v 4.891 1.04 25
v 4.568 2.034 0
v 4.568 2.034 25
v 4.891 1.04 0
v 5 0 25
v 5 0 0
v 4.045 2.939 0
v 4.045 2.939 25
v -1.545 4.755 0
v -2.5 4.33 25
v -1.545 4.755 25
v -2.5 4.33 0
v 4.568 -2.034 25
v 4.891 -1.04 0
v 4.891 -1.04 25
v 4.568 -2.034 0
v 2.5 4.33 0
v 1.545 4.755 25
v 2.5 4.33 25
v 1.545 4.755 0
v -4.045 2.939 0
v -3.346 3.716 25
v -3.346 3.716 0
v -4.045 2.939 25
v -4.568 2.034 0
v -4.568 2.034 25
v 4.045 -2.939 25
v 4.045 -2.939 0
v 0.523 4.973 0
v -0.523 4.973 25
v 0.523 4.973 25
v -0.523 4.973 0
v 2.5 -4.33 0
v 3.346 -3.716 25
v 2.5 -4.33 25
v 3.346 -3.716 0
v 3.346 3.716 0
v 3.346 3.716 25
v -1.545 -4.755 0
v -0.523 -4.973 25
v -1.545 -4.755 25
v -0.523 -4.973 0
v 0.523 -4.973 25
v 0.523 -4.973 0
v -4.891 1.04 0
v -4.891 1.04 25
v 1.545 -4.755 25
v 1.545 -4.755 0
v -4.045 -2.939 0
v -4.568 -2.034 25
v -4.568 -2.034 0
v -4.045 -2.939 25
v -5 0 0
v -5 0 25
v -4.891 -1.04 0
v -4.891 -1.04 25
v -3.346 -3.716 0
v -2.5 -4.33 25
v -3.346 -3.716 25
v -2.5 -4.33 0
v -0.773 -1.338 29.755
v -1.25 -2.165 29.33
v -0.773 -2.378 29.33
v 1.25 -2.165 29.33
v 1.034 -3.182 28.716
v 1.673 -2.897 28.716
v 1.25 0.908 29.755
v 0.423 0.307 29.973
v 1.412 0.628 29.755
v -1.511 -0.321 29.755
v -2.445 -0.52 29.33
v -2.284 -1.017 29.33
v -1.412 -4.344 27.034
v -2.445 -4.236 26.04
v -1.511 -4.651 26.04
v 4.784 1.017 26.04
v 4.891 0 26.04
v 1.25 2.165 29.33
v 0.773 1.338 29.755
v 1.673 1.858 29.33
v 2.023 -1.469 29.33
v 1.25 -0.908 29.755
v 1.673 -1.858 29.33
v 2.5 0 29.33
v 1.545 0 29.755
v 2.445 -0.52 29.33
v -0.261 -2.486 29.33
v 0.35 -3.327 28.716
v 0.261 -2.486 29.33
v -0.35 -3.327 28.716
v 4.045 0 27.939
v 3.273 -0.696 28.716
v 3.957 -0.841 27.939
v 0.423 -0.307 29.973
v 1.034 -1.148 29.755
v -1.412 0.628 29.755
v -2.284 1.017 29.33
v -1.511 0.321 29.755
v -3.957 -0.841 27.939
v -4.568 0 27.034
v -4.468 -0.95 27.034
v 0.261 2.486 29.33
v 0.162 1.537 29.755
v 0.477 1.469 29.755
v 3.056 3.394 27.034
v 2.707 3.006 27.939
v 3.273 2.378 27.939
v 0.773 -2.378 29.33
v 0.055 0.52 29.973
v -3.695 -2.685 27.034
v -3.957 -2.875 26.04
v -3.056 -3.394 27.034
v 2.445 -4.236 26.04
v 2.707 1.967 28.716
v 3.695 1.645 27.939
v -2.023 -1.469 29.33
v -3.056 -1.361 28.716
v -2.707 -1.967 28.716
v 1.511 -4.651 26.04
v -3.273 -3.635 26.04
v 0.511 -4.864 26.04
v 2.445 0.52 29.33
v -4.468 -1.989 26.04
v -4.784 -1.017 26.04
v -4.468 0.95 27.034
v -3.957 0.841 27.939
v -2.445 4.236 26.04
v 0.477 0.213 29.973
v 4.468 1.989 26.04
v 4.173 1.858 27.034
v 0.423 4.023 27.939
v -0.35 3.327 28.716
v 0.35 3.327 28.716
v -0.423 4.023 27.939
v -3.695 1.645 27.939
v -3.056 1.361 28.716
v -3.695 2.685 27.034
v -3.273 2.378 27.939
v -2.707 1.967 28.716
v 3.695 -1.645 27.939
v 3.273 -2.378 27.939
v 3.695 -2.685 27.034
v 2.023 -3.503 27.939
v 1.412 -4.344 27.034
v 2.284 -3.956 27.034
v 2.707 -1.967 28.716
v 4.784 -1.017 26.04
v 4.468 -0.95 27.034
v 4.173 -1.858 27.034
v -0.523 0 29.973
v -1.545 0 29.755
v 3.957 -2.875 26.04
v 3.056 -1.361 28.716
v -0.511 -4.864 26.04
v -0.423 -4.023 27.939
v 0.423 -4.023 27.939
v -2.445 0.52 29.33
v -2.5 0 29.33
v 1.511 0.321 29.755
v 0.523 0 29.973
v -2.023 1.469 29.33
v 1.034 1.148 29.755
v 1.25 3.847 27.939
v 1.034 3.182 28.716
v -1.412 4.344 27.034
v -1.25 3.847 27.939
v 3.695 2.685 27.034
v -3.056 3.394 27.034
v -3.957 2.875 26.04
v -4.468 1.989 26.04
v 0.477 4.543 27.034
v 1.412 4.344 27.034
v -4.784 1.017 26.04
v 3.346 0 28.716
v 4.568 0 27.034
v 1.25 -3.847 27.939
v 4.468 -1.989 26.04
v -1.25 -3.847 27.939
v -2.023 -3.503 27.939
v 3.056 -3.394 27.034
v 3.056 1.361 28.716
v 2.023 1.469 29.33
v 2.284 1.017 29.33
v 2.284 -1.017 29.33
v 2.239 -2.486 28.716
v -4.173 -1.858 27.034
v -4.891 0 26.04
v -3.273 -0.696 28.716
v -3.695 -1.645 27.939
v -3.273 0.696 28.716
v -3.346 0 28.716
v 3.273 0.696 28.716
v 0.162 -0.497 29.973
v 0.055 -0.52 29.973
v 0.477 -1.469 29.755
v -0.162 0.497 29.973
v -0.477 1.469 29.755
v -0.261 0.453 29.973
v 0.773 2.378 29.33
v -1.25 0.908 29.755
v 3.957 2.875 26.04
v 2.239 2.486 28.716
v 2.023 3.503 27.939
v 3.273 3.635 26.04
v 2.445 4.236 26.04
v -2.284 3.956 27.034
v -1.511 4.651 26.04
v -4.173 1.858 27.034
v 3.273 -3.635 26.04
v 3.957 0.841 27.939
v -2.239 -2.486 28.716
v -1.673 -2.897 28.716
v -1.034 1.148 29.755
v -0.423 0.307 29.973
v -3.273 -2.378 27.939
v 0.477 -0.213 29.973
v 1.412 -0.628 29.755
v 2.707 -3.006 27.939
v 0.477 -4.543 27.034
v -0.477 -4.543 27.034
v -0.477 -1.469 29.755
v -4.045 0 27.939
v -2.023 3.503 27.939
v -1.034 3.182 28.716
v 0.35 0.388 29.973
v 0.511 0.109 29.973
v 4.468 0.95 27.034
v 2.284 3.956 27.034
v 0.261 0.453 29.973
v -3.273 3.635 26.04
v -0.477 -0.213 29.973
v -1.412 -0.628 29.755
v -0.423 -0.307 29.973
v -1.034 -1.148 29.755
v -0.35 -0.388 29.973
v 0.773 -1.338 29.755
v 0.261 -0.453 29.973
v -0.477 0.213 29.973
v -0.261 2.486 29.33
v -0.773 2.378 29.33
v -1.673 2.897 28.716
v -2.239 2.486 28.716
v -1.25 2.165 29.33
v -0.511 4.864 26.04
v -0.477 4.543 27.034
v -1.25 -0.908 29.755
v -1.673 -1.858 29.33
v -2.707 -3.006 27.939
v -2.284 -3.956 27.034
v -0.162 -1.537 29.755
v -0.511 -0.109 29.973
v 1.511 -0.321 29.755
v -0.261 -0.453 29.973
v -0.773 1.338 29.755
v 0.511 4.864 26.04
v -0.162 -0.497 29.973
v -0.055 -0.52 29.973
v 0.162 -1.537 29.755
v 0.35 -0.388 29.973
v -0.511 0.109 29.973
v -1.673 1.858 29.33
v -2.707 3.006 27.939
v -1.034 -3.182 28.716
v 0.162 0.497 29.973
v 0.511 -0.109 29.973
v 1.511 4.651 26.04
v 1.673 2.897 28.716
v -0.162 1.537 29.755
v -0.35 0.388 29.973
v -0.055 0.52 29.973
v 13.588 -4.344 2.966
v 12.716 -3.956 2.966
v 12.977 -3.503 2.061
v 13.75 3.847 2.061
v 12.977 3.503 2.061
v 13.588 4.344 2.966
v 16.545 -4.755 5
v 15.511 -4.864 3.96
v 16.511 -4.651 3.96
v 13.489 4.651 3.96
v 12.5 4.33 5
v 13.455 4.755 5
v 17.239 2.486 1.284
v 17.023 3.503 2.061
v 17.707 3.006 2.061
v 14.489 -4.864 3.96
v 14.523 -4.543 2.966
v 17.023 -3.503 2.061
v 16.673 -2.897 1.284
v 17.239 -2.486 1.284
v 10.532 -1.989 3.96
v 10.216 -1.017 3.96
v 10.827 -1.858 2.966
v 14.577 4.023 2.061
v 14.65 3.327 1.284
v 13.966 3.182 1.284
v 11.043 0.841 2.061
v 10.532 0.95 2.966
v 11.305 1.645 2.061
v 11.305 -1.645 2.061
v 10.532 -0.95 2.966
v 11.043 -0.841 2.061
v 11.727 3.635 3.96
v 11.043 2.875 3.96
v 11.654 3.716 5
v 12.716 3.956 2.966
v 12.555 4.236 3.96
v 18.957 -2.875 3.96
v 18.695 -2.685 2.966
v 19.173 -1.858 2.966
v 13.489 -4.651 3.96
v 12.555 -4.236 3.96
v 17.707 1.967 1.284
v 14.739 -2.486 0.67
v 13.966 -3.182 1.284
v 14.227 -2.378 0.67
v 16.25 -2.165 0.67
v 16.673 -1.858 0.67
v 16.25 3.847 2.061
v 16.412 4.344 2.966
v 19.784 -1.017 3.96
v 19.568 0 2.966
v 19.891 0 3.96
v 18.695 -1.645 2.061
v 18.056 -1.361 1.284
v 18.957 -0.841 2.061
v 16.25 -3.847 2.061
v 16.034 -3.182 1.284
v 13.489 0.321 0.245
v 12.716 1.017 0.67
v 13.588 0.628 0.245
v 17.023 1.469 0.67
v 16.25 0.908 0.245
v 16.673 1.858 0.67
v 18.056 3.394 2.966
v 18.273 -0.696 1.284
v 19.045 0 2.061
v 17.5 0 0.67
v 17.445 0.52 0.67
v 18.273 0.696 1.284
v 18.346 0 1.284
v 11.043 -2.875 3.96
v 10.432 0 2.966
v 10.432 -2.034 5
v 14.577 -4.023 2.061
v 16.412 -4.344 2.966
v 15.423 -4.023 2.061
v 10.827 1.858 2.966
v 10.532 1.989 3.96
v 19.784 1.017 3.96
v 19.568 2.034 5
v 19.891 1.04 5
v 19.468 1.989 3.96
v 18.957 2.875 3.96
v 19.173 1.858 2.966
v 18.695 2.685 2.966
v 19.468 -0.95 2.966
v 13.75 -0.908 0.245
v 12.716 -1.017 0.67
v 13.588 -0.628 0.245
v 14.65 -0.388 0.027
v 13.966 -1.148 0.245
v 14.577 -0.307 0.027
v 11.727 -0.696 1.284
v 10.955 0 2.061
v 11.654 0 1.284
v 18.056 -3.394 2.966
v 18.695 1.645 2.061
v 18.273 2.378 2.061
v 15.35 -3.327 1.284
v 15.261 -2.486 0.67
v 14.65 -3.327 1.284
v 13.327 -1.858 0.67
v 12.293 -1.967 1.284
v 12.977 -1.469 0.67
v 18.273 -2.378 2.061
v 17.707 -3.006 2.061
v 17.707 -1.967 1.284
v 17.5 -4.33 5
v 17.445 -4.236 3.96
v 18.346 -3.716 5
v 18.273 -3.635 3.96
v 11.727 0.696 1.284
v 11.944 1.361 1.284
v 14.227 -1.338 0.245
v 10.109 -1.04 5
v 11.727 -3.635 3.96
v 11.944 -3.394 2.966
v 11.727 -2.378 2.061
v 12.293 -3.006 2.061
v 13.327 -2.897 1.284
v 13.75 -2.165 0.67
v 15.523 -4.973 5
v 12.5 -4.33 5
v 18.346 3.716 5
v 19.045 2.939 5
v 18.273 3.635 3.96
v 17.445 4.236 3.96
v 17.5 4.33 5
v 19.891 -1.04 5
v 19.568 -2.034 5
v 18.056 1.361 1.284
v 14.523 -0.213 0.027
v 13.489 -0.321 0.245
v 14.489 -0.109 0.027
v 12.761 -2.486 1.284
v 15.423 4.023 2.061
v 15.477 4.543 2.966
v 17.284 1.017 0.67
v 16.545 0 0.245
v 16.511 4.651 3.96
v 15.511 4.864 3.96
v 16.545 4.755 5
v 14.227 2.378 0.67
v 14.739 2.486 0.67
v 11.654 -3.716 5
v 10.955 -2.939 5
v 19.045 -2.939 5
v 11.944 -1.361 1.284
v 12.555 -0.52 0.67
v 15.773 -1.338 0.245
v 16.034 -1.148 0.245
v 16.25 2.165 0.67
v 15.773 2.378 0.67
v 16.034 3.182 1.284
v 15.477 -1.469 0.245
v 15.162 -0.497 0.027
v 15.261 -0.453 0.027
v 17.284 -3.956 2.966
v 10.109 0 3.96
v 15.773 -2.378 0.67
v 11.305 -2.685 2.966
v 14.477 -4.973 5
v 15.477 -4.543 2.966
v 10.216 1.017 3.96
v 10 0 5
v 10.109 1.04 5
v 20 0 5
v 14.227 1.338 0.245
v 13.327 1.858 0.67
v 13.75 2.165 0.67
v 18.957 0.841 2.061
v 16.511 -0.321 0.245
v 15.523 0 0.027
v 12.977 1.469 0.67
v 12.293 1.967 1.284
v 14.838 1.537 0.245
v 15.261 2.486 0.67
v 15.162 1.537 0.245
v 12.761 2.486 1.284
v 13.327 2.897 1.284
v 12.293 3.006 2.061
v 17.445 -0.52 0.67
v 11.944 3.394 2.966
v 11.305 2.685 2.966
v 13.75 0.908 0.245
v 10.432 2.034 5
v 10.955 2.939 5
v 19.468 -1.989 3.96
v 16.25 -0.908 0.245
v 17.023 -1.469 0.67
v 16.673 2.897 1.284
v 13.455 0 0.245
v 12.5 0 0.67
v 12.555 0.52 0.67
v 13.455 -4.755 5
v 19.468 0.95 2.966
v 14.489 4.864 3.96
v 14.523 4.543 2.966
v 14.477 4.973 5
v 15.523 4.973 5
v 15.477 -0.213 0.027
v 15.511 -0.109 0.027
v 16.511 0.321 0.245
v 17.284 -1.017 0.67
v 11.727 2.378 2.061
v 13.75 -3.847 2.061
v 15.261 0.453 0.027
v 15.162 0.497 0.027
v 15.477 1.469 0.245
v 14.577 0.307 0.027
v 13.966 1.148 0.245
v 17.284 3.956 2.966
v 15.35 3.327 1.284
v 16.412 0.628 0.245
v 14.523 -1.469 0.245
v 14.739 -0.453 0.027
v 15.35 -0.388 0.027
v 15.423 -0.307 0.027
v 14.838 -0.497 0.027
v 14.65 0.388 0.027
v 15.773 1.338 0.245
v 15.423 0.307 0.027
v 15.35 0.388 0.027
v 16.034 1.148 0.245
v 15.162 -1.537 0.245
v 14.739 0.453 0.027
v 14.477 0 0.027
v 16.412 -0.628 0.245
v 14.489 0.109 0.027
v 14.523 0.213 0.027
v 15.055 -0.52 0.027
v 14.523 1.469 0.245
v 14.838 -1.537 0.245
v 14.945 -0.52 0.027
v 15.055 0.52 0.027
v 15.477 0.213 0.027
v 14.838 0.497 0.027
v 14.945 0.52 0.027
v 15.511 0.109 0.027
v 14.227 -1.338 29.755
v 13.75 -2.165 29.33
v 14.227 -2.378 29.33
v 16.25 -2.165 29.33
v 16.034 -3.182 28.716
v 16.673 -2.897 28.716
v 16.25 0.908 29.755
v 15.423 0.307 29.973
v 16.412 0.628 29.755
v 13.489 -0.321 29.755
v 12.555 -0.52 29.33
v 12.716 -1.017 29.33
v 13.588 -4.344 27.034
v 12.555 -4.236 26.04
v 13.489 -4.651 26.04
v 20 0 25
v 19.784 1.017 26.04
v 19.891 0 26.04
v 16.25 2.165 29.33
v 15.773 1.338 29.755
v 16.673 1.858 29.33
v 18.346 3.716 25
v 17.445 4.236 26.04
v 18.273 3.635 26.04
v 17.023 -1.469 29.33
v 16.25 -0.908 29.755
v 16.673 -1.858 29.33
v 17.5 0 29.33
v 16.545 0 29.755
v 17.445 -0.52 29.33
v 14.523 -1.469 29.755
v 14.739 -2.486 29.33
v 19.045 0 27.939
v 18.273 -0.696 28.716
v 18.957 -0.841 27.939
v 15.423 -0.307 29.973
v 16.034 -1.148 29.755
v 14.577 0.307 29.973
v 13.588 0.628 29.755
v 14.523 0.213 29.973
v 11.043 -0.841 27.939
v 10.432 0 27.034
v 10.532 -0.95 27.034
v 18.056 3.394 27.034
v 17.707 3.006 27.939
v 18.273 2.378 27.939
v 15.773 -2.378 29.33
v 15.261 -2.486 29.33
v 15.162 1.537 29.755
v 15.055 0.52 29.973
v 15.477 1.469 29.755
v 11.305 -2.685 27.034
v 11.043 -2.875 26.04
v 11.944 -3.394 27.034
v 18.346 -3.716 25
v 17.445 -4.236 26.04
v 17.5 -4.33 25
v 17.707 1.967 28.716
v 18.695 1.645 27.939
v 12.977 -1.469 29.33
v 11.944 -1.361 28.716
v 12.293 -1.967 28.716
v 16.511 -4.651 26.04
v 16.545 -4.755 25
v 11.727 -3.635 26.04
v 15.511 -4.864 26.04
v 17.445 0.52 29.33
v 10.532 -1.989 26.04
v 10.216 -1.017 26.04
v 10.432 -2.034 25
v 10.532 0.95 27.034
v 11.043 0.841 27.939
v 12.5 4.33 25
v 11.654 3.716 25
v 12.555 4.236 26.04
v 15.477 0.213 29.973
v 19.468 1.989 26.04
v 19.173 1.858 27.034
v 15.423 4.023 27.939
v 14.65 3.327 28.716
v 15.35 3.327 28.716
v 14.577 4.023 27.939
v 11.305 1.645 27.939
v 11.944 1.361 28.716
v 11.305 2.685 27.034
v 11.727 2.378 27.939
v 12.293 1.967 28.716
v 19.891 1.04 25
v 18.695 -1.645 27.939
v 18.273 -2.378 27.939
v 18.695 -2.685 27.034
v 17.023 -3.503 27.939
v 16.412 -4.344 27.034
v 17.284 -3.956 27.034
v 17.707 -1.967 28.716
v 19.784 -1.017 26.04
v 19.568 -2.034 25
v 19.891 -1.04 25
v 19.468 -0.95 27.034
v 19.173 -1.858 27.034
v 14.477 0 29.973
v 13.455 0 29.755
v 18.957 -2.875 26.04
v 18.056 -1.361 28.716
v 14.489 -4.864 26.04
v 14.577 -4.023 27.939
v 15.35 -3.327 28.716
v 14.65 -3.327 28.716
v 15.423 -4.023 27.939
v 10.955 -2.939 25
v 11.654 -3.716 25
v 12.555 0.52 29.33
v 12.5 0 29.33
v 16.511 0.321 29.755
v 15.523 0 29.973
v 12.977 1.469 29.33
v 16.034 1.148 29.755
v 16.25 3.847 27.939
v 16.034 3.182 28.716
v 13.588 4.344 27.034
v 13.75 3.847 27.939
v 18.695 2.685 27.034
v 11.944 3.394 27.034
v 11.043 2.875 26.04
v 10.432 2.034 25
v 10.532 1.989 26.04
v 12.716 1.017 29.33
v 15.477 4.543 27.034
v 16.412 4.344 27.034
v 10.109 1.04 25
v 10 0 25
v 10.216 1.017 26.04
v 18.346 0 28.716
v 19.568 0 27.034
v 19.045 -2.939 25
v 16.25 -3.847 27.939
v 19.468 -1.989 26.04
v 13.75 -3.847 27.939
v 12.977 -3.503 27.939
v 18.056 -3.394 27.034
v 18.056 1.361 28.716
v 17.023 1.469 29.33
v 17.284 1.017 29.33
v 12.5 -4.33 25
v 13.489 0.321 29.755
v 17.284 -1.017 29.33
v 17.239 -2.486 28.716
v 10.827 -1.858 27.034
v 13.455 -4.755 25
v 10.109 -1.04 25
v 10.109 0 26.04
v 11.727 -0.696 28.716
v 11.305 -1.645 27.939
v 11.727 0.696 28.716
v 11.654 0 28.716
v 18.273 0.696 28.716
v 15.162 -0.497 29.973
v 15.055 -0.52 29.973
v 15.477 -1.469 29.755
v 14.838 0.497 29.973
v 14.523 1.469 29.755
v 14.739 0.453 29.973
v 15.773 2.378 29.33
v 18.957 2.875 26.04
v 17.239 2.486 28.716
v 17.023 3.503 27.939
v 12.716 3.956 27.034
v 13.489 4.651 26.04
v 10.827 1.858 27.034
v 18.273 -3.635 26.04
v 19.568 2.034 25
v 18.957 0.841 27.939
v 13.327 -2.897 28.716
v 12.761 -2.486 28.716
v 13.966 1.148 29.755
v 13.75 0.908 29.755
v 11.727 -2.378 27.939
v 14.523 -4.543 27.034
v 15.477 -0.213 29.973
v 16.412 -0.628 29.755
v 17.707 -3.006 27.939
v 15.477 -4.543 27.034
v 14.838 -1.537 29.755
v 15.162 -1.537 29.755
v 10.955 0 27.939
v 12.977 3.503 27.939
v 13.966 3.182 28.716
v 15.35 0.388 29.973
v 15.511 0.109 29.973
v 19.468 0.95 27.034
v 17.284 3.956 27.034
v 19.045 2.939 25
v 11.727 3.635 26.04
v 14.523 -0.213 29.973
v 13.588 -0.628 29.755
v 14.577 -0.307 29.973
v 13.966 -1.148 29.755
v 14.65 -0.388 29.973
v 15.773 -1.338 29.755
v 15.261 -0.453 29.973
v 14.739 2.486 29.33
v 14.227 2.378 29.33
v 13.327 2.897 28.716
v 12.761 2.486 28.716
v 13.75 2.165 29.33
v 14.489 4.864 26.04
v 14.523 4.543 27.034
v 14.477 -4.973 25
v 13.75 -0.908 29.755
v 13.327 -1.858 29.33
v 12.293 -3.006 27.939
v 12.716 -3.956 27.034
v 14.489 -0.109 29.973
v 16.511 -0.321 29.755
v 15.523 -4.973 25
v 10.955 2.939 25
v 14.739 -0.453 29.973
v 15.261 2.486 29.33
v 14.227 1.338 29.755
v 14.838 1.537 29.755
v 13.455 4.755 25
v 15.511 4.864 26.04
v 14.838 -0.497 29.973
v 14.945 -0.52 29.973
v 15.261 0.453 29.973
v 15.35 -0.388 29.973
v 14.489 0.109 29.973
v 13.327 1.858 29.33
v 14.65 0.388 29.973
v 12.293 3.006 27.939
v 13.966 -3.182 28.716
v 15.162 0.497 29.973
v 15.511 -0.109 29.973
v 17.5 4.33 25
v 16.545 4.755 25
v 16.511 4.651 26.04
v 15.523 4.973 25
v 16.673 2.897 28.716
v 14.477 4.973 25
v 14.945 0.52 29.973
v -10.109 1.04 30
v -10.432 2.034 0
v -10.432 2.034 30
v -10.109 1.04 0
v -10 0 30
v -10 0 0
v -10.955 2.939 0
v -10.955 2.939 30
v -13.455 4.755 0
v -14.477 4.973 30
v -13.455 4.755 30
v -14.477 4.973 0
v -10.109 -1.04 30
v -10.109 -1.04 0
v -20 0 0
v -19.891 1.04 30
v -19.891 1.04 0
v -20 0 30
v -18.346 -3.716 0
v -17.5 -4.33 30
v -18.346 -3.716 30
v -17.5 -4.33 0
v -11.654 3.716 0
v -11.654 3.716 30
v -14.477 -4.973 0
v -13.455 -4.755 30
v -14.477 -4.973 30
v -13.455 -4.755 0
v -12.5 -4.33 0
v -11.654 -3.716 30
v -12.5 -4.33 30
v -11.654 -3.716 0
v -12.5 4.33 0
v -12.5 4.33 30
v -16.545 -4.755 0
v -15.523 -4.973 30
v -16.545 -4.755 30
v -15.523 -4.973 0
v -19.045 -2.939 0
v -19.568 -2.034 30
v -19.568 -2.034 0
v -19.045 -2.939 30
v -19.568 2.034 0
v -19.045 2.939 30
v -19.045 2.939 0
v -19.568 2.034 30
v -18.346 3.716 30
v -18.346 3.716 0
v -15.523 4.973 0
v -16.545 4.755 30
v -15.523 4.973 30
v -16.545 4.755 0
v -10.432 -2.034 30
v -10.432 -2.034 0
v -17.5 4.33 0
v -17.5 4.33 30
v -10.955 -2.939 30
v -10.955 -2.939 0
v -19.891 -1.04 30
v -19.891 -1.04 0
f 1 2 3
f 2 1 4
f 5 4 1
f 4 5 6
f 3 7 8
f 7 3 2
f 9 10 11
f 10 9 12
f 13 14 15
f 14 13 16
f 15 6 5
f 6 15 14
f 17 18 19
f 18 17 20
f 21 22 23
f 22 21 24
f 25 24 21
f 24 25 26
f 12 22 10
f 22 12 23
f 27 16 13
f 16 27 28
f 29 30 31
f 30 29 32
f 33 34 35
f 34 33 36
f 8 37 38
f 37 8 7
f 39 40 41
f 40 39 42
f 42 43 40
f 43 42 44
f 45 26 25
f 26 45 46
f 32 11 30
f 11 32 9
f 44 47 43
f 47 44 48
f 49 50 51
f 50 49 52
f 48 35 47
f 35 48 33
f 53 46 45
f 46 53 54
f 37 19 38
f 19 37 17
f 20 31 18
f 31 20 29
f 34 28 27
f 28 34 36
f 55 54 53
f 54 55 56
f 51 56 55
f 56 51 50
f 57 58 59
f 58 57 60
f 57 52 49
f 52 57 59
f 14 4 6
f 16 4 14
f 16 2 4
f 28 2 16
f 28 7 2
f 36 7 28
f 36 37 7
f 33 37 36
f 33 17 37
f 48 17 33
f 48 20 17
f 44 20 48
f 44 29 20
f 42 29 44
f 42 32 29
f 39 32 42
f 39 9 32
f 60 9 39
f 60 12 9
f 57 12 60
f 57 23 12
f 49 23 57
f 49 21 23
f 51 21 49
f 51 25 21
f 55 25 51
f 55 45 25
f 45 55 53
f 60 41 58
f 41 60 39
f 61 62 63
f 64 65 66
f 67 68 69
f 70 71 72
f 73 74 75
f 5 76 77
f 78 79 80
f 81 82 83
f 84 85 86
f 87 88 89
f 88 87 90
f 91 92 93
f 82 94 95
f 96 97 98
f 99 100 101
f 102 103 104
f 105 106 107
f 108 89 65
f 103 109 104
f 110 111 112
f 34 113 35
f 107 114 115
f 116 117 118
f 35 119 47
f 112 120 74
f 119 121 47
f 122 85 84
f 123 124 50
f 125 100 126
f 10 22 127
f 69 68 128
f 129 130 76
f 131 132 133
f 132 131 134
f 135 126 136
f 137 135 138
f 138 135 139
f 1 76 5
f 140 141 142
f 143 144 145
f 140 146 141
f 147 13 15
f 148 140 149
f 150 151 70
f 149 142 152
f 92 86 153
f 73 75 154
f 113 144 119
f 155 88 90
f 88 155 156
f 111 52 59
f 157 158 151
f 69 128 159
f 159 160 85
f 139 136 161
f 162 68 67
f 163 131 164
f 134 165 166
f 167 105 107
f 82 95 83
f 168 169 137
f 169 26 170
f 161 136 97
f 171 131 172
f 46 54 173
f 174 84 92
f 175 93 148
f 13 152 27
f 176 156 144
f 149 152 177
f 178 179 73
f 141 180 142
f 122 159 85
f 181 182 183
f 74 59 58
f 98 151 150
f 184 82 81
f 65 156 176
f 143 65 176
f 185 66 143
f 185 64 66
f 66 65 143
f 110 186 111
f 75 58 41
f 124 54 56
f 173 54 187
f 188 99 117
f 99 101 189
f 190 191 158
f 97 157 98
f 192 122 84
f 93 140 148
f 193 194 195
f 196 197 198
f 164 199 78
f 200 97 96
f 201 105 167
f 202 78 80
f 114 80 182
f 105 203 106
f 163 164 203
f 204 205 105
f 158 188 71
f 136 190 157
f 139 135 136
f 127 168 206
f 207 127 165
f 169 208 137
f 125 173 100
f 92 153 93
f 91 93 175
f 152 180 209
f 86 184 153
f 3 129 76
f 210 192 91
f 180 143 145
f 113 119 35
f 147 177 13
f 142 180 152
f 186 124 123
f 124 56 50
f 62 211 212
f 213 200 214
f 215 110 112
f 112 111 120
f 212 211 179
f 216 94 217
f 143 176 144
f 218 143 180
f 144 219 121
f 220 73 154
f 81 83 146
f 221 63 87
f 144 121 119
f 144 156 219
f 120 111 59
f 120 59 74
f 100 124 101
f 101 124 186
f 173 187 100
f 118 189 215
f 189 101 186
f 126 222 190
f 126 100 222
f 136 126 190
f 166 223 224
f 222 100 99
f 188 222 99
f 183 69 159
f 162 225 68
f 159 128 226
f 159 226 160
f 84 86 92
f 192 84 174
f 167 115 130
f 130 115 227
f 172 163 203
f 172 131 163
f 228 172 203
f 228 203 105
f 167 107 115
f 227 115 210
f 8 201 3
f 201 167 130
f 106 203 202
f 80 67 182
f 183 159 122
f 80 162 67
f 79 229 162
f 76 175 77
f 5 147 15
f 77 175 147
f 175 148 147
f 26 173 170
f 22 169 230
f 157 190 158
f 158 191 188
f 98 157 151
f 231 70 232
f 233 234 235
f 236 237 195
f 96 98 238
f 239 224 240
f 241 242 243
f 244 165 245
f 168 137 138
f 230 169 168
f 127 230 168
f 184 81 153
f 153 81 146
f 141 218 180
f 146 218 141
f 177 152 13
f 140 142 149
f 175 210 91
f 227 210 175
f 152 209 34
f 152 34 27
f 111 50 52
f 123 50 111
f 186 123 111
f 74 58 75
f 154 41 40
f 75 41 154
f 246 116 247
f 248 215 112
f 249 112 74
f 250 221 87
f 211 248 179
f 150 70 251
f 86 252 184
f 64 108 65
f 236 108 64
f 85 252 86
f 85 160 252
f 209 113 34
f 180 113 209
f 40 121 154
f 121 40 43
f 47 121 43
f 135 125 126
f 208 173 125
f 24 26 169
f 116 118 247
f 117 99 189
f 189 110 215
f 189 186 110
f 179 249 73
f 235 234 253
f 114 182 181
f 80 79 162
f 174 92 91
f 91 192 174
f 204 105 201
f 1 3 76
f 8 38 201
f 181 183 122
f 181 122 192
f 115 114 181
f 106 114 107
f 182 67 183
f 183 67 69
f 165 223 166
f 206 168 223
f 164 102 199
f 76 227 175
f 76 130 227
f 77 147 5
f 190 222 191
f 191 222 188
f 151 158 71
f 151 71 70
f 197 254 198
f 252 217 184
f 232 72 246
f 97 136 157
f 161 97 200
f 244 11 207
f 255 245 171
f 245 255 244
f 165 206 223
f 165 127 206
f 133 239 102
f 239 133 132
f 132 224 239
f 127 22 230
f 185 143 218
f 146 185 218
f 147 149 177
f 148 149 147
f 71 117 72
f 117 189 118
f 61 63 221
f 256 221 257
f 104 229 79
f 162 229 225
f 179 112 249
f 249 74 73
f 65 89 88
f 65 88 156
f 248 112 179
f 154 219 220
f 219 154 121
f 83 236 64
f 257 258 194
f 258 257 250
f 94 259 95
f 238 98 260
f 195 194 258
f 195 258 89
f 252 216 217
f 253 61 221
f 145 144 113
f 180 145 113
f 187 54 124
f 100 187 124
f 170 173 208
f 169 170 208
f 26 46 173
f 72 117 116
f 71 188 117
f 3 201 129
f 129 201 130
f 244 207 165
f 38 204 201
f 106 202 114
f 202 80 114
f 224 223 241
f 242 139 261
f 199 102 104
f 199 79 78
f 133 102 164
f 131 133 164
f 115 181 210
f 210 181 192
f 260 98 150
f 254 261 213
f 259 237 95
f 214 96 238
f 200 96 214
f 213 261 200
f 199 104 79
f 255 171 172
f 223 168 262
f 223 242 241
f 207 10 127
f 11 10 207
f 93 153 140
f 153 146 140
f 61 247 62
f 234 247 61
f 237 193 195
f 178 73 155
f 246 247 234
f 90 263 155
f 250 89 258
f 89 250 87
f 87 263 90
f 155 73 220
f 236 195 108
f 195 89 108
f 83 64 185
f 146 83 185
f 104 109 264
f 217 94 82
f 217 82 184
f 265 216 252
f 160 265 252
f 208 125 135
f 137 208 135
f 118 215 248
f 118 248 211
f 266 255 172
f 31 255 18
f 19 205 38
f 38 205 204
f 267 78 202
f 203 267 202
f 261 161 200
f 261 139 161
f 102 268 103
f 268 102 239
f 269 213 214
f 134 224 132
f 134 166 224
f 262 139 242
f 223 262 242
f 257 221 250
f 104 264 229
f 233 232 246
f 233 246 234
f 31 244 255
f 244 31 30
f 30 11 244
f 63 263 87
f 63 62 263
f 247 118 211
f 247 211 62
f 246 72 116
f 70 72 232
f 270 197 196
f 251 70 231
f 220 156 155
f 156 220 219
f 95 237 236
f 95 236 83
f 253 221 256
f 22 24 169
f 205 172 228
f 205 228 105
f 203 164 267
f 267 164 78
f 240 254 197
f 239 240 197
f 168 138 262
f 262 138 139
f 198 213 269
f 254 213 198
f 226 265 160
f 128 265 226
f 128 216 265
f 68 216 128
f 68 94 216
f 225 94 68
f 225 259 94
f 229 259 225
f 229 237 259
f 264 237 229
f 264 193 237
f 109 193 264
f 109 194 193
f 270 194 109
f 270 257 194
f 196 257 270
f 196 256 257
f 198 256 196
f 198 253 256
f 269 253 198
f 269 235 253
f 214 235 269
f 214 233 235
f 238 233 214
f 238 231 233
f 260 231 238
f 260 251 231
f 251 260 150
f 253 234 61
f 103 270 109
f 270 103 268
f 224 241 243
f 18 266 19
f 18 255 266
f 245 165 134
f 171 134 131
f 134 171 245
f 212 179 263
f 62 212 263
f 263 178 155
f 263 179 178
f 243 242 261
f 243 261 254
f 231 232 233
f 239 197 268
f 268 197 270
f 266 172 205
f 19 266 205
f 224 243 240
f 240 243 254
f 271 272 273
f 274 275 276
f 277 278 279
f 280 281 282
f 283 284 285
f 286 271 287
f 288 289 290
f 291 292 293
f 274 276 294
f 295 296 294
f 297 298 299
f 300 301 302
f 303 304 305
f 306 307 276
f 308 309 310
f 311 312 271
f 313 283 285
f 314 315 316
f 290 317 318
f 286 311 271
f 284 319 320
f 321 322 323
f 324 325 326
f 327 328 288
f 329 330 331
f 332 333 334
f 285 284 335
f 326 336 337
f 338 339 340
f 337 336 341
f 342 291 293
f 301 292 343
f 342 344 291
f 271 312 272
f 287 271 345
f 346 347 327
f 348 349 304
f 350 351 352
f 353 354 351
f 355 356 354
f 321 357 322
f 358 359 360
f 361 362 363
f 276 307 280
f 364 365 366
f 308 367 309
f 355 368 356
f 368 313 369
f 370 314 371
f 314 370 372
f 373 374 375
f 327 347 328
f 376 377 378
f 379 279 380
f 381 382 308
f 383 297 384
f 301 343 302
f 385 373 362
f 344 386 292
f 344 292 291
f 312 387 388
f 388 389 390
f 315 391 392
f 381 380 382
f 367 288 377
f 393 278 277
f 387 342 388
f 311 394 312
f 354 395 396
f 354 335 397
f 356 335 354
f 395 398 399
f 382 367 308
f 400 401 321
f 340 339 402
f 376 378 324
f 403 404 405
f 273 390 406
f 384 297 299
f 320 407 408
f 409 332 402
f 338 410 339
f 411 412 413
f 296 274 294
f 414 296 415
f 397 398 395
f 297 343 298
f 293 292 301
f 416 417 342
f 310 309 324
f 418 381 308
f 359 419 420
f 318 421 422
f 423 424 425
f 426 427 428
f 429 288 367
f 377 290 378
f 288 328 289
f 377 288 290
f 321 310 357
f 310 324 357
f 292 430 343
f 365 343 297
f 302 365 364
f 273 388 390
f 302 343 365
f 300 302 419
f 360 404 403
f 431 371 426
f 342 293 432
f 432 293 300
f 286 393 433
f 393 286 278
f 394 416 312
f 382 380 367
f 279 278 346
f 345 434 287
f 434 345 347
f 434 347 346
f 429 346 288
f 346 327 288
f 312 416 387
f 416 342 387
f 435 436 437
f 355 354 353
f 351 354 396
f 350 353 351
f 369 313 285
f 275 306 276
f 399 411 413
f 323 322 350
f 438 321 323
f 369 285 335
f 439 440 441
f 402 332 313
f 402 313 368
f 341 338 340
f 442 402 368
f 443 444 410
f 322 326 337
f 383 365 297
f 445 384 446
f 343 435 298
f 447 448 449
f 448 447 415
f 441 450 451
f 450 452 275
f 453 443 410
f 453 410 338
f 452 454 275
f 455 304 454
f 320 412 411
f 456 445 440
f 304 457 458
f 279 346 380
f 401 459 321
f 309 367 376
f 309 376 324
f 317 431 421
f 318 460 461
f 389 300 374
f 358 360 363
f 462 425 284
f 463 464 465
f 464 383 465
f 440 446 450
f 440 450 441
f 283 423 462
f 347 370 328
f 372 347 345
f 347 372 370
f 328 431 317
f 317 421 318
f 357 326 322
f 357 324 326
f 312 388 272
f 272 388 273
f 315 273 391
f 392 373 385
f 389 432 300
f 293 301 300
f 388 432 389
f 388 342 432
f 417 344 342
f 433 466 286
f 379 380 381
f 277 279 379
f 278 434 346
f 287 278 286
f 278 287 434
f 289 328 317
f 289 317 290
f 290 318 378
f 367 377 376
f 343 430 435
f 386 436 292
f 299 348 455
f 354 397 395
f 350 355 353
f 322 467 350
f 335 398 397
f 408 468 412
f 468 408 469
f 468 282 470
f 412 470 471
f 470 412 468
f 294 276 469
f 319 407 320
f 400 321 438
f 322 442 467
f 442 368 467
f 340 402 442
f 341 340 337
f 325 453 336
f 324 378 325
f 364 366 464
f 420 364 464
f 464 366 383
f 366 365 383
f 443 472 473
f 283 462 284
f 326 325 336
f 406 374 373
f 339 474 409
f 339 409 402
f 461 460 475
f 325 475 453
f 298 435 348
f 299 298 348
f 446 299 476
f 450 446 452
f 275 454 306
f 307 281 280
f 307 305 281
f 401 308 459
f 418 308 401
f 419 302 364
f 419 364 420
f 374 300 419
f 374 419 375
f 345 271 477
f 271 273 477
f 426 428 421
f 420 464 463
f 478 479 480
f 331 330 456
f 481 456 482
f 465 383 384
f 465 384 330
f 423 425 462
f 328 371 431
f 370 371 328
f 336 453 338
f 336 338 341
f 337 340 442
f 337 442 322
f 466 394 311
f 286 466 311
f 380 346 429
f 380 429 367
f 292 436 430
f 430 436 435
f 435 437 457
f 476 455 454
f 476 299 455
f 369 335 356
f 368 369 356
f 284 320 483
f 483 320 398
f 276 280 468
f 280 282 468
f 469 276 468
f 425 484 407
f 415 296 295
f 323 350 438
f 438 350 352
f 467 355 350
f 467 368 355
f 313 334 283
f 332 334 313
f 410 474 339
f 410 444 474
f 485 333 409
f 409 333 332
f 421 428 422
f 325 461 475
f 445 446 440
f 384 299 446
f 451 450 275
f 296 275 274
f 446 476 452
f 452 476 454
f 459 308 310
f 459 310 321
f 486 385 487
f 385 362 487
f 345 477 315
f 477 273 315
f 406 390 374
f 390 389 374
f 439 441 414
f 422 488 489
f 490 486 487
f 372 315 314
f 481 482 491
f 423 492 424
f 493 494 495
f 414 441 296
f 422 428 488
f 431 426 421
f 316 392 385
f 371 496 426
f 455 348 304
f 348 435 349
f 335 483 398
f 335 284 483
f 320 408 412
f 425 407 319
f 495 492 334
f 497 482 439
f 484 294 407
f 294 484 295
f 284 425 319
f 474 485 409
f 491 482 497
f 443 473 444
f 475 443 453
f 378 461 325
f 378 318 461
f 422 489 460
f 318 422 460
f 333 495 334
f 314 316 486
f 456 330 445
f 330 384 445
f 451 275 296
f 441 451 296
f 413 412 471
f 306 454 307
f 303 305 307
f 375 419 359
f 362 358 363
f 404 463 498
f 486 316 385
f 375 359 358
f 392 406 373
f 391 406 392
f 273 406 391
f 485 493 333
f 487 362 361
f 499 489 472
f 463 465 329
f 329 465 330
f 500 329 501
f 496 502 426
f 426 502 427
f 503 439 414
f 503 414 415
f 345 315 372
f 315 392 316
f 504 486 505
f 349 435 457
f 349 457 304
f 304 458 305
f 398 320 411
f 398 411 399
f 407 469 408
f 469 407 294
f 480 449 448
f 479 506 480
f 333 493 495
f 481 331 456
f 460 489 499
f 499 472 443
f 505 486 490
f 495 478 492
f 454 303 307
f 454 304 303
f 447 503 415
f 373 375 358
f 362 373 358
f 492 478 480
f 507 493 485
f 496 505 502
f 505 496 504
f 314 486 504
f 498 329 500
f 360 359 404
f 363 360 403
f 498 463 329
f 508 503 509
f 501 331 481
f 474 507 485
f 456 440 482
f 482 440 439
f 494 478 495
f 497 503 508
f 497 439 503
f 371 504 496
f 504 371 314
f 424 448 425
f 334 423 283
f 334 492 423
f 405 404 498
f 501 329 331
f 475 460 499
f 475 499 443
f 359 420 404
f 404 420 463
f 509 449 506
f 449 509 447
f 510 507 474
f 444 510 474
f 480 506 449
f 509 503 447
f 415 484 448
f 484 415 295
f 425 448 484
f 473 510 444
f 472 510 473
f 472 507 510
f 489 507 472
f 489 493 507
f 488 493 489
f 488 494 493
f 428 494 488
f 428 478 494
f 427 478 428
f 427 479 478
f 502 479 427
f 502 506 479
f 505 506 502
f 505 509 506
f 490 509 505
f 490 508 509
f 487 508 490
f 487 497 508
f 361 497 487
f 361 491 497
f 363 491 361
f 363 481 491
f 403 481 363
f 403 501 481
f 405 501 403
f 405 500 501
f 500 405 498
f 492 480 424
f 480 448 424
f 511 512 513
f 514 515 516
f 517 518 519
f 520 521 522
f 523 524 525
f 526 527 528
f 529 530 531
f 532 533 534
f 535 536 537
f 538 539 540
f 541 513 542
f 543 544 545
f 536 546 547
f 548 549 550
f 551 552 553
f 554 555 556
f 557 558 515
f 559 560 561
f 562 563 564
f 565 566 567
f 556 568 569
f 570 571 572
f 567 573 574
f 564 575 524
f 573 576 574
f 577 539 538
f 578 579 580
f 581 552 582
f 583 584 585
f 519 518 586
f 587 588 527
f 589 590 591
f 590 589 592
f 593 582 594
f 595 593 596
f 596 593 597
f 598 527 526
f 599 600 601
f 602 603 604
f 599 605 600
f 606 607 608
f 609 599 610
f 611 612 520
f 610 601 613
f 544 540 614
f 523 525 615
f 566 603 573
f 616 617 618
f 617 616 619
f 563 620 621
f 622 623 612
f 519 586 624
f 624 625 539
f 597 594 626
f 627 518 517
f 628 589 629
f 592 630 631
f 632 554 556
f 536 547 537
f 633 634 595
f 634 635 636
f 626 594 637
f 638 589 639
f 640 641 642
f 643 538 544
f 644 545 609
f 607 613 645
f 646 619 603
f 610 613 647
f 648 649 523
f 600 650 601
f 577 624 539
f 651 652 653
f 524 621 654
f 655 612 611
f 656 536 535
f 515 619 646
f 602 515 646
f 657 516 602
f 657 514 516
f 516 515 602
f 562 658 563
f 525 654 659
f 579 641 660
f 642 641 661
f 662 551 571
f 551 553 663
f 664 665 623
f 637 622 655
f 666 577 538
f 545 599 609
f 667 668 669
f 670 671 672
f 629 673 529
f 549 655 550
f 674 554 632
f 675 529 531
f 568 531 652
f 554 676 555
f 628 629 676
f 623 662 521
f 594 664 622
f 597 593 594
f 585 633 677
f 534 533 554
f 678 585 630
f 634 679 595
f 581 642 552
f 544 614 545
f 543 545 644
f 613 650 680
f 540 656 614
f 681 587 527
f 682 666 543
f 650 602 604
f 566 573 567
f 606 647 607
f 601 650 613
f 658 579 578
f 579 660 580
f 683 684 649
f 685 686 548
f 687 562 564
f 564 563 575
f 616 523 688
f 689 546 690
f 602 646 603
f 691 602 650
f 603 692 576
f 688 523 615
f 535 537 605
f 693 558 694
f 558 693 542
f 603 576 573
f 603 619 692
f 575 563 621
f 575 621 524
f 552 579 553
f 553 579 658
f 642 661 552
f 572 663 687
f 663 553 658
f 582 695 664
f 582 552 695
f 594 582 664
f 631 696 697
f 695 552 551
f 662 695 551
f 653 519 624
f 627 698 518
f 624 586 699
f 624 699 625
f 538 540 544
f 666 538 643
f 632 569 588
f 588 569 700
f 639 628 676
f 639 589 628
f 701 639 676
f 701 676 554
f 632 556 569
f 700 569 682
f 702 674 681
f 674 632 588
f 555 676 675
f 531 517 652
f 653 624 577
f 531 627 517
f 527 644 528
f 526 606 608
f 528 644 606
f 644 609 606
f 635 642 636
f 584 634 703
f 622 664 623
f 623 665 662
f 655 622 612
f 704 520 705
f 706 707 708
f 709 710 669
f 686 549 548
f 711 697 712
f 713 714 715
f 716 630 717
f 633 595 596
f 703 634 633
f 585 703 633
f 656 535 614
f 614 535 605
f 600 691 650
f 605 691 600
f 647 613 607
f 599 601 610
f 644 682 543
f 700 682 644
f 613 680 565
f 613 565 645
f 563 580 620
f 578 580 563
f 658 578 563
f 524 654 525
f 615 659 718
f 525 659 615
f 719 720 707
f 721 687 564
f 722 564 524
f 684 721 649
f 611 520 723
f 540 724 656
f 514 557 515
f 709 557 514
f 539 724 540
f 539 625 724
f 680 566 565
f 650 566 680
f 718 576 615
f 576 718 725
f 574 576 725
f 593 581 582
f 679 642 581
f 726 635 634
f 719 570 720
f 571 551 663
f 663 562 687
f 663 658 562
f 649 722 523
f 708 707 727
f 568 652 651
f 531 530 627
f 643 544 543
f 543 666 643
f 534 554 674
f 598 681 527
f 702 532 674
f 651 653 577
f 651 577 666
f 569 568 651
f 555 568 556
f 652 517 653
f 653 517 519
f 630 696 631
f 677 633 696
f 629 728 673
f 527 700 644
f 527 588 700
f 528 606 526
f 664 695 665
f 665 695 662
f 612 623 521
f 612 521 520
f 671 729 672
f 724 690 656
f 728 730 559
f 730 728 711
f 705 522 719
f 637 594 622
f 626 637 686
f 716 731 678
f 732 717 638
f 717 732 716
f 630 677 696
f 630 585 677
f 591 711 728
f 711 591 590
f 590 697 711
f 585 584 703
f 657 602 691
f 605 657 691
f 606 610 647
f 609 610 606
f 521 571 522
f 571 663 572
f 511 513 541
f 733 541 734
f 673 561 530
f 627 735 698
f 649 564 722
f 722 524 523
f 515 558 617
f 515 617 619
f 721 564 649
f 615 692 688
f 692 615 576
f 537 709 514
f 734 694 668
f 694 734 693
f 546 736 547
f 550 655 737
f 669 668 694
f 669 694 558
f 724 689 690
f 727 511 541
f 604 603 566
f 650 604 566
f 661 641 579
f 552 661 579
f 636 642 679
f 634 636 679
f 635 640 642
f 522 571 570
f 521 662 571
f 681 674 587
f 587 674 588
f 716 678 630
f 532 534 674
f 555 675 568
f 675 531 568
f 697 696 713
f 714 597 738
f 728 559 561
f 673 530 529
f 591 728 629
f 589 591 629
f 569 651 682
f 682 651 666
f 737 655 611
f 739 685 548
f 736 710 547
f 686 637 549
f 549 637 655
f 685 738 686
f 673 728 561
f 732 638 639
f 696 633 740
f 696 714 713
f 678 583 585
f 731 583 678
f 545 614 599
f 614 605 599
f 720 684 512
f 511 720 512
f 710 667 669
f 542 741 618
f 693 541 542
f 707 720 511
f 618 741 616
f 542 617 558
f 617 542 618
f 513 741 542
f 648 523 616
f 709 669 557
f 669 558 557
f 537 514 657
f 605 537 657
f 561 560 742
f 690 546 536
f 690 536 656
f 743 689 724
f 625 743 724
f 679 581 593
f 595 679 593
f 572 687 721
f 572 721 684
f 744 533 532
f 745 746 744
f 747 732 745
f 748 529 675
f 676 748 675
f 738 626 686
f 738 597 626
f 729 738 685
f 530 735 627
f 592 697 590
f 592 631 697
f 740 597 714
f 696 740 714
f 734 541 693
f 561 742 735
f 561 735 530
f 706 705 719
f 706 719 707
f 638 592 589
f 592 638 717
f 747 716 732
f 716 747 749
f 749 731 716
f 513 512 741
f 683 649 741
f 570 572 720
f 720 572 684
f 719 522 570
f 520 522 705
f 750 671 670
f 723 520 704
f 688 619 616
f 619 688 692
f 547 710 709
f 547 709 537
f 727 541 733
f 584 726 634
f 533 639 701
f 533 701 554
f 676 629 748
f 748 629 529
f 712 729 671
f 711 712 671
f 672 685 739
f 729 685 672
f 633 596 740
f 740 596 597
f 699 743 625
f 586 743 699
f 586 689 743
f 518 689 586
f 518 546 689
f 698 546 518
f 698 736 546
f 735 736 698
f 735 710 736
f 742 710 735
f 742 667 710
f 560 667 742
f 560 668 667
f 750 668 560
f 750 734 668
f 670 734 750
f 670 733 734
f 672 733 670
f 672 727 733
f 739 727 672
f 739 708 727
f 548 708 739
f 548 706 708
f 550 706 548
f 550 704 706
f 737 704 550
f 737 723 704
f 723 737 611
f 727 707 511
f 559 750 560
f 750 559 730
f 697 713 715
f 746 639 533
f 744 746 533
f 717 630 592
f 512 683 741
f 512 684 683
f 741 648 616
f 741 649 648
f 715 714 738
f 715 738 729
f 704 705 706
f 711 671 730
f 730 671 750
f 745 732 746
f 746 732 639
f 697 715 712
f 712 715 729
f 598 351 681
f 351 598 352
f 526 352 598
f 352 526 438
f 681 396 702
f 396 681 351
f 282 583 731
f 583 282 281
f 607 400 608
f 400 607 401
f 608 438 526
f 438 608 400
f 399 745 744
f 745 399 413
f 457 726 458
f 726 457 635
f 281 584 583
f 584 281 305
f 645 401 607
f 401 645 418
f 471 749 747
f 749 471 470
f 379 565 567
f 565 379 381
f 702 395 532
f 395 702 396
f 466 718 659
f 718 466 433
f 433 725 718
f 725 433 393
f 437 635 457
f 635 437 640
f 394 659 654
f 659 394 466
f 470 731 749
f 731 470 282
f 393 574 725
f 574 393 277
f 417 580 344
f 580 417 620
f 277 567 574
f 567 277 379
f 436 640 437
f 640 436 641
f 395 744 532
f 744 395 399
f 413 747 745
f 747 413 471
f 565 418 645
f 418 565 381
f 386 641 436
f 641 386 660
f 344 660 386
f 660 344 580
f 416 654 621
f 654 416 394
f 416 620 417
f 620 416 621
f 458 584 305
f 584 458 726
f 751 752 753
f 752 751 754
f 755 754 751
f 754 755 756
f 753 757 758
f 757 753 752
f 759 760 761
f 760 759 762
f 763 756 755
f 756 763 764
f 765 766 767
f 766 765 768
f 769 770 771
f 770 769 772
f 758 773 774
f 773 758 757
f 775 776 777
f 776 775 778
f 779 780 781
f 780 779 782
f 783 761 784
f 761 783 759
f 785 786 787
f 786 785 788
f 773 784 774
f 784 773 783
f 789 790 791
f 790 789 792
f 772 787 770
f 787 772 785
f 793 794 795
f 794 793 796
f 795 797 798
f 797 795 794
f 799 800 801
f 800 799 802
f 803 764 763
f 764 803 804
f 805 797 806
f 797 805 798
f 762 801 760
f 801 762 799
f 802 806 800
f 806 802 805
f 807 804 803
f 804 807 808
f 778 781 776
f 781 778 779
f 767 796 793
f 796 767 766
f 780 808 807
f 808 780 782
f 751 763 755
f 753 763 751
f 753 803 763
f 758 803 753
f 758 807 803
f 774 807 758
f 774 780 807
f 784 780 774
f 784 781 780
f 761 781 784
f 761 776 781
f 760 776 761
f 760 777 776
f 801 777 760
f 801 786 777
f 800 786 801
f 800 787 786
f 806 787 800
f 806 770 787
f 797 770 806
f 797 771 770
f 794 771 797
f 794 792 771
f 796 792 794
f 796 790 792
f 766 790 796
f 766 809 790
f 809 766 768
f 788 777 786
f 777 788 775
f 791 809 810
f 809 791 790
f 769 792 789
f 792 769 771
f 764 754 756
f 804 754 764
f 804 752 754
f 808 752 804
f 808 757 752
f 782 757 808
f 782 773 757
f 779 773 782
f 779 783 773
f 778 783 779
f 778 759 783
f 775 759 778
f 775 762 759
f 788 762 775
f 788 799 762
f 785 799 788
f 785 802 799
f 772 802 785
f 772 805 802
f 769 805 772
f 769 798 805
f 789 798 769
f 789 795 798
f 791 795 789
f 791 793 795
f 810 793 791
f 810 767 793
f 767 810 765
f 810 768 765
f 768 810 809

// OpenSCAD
//-- Cilindro redondeado en las tapas
//-- Parametros:
//-- r: radio del cilindro
//-- h: Altura del cilindro
//-- center : [true, false], centrar el cilindro
//-- both: [true, false]
//--    true: Redondear ambas tapas (superior e inferior)
//--    false: solo se redondea la tapa superior
module rcylinder(r = 4, 
                 h = 20, 
                 center = false, 
                 both = false, $fn = 30)
{

  //-- Calcular la altura del cilindro interior
  //-- Si redondeo por las dos tapas, vale h - 2*r
  //-- si solo una tapa entonces h - r
  hc = (both == true) ? h - 2 * r : h - r;
  
  //-- Calcular la traslacion para centrar el cilindro
  pcenter = (center == true) ? 0 : h/2;
  
  //-- Aplicar traslaciopn para el centrado
  translate([0, 0, pcenter]) 
  
    //-- Cilindro con ambas tapas redondeadas
    //-- Se pone un cilindro de altura hc y una esfera
    //-- en la parte superior y otra en la inferior
    if (both == true) {
      cylinder(r = r, h = hc, center = true, $fn = $fn);
      
      //-- Esferas superior e inferior
      for (i = [-1, 1])
        translate([0, 0, i * hc / 2])
          sphere(r = r);
          
    }
    //-- Cilindro con tapa superior redondeada
    else
      //-- Centrar la figura
      translate([0, 0, -h/2]) {
      
        //-- Cilindro + esfera
        cylinder(r = r, h = hc, $fn = $fn);
          translate([0, 0, hc]) sphere(r = r, $fn = $fn);
      }
        
}

//-- Parametros para los ejemplos
r = 5;
h = 30;
center = false;
$fn = 30;

//-- Cilindro normal
translate([-3*r, 0, 0])  
  cylinder(r = r, h = h, center = center, $fn = $fn);

//-- Cilindro con tapa superior redondeada
rcylinder(r = r, h = h, both = false, center = center, $fn = $fn);

//-- Cilindro con ambas tapas redondeadas
translate([3*r, 0, 0])  
  rcylinder(r = r, h = h, both = true, center = center, $fn = $fn);
  
  
